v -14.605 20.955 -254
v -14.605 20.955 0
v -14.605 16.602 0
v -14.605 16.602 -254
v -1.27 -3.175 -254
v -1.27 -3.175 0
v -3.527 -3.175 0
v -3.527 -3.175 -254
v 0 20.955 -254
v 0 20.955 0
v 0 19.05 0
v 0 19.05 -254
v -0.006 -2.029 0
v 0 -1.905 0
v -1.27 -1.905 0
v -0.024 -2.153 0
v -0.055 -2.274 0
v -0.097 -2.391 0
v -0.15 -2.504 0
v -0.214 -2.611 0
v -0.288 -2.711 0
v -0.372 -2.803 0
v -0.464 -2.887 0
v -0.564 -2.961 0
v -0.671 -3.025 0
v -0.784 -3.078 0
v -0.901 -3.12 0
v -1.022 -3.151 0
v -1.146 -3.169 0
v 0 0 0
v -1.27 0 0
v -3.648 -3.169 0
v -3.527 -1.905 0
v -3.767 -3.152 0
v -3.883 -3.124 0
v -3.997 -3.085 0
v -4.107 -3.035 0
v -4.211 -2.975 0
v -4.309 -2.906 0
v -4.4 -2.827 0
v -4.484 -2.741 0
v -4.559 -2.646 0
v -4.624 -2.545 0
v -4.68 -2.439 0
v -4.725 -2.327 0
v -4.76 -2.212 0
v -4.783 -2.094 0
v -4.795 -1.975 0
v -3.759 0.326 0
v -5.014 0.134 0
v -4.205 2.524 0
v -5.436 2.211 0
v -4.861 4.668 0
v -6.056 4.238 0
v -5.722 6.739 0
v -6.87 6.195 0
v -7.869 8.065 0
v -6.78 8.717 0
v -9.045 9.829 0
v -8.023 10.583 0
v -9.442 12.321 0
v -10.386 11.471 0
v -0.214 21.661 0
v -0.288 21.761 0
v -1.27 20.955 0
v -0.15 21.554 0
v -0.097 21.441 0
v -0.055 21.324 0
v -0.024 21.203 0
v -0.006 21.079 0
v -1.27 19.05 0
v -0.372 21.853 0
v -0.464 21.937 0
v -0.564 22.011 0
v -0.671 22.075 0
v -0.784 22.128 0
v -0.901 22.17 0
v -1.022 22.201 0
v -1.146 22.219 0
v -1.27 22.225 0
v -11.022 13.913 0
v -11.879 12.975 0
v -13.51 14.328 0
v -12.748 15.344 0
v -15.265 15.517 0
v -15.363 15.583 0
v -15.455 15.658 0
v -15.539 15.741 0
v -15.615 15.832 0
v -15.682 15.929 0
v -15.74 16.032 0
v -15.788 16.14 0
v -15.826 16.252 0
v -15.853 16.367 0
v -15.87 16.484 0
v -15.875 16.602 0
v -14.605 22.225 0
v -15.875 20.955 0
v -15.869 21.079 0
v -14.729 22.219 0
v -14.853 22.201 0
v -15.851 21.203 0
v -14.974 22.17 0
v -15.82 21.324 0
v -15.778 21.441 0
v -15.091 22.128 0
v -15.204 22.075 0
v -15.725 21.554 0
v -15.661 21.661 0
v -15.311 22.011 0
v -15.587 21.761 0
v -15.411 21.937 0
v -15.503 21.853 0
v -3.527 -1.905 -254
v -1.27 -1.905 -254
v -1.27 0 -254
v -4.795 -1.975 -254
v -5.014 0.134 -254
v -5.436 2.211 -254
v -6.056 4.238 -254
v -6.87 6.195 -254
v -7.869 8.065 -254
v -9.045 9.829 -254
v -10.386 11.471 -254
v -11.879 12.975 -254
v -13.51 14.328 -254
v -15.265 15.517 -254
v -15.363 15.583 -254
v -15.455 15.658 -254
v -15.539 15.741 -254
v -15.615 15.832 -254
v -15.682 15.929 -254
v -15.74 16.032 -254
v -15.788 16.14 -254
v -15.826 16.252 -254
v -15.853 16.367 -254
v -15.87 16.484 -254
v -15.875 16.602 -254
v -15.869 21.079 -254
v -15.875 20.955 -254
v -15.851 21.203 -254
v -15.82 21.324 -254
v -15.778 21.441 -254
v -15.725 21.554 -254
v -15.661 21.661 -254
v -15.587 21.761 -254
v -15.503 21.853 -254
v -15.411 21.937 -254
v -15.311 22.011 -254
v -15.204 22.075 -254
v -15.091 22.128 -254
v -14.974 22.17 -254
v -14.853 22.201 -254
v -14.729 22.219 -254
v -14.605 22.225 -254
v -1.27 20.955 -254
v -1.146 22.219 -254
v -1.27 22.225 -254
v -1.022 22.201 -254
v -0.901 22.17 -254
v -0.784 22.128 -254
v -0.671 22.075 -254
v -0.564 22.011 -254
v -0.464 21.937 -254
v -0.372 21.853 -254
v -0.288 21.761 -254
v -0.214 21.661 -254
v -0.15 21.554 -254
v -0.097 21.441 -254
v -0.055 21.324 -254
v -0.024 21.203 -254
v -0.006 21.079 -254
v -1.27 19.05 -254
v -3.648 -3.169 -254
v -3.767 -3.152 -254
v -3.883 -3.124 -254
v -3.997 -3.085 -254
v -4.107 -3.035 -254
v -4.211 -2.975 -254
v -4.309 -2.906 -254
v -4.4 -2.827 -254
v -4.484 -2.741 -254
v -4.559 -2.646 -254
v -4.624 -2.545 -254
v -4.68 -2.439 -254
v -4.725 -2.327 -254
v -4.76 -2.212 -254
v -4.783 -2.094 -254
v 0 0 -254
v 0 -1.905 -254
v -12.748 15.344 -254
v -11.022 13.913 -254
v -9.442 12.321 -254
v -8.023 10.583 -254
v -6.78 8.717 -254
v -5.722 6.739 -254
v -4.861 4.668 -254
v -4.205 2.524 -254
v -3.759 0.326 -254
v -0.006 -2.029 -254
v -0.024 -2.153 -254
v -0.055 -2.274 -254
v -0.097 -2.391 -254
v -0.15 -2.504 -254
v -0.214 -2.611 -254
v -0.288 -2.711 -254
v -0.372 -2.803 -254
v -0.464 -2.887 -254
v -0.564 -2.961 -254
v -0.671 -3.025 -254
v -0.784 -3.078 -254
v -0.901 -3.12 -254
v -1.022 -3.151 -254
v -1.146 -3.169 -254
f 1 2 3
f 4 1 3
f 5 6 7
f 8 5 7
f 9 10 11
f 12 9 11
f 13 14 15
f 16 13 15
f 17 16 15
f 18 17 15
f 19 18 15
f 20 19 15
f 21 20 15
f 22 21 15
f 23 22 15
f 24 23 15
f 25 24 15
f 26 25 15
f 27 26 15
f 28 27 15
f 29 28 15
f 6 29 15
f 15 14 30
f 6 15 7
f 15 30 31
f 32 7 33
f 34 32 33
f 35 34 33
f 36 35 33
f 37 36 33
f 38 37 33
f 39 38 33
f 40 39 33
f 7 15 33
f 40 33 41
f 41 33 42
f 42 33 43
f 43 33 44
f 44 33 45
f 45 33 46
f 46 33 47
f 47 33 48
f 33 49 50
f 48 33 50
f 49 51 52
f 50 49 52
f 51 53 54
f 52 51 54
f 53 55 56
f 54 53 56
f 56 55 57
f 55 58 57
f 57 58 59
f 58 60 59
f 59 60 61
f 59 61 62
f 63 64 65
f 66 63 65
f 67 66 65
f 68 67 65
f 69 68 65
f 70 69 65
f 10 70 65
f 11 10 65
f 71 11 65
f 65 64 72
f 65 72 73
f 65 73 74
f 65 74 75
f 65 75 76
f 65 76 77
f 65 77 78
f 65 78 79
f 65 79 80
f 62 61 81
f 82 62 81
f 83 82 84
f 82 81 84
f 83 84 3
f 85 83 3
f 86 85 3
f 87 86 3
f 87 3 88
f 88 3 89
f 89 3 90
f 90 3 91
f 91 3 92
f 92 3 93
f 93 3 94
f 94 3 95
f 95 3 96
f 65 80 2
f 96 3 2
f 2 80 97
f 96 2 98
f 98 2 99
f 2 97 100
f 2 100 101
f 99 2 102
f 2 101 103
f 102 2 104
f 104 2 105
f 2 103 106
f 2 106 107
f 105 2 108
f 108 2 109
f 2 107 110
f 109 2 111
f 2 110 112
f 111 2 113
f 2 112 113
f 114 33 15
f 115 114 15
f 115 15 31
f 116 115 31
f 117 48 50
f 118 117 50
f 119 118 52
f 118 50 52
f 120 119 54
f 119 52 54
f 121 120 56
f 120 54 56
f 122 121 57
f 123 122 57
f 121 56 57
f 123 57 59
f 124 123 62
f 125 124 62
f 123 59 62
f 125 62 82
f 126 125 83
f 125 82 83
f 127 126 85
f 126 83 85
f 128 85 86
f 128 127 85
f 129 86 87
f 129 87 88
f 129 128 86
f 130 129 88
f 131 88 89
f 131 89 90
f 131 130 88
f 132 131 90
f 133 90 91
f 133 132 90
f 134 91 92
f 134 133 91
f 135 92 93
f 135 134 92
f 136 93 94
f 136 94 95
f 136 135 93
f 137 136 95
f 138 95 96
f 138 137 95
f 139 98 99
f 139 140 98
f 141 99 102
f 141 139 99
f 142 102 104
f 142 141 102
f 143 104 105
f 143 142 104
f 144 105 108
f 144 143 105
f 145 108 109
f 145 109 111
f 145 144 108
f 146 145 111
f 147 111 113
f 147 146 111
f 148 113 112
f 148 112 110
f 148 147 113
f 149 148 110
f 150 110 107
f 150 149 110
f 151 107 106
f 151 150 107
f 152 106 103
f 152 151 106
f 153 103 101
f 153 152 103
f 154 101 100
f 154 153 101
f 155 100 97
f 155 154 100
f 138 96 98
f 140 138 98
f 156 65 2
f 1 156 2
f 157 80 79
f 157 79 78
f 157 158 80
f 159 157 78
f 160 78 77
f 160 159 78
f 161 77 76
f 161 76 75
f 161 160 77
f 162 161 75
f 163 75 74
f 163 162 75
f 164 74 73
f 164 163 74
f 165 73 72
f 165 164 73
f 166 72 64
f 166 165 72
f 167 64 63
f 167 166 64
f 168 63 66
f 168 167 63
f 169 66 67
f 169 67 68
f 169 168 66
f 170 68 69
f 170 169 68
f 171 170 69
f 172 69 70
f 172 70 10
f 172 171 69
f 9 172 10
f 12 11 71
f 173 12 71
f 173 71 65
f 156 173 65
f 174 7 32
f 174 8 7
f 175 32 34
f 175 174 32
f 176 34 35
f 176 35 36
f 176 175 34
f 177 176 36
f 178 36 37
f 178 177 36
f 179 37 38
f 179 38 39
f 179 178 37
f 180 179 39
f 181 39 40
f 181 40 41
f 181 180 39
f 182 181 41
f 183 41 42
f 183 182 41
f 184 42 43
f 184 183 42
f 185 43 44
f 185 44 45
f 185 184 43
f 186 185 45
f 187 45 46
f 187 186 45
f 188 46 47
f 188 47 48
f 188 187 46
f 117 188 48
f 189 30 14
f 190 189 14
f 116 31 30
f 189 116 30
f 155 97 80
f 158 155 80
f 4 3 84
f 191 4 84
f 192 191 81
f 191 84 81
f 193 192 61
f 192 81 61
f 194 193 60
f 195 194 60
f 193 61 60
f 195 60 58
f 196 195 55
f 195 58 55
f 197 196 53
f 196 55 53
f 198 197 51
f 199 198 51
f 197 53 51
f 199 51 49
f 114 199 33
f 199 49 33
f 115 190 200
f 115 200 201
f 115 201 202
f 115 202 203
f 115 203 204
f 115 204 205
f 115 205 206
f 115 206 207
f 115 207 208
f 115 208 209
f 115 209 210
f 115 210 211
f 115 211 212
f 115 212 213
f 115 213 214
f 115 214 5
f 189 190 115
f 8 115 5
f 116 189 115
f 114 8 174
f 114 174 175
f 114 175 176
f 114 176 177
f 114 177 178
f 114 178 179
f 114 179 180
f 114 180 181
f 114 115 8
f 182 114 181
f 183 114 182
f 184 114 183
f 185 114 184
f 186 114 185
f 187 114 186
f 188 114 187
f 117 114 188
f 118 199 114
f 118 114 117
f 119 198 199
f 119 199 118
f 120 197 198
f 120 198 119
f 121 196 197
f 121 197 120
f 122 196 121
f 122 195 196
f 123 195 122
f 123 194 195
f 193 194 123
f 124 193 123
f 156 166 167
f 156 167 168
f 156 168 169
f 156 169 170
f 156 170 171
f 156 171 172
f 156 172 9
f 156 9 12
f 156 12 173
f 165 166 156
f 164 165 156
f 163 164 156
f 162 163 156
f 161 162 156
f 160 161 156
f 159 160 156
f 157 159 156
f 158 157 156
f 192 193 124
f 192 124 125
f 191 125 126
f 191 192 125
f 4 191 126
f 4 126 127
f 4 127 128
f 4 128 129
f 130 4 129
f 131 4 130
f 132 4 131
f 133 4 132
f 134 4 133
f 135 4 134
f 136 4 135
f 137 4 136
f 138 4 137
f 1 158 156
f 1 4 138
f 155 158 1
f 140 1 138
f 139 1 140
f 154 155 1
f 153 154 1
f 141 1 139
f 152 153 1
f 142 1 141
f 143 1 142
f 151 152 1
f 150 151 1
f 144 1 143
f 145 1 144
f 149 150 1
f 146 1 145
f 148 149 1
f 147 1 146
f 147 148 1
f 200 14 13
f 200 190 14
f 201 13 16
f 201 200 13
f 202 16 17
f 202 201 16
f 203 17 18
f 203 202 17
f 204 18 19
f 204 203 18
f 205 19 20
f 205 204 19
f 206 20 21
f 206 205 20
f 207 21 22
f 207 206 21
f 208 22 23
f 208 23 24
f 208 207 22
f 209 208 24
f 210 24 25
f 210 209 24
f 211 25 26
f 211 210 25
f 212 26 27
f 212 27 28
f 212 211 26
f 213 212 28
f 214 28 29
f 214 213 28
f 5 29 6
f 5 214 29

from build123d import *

# Parameters (mm, degrees)
EXTRUDE_THIN1_DEPTH = 254
FILLET1_R           = 1.27


with BuildPart() as part:
    # Sketch1 → Extrude-Thin1 (new body)
    with BuildSketch(Plane.XY):
        with BuildLine():
            Line((0, 0), (0, -3.175))
            Line((0, -3.175), (-4.7625, -3.175))
            ThreePointArc((-4.7625, -3.175), (-7.743674429, 7.852127417), (-15.875, 15.875))
            Line((-15.875, 15.875), (-15.875, 22.225))
            Line((-15.875, 22.225), (0, 22.225))
            Line((0, 22.225), (0, 19.05))
            Line((0, 19.05), (-1.27, 19.05))
            Line((-1.27, 19.05), (-1.27, 20.955))
            Line((-1.27, 20.955), (-14.605, 20.955))
            Line((-14.605, 20.955), (-14.605, 16.601962608))
            ThreePointArc((-14.605, 16.601962608), (-6.779670812, 8.71710723), (-3.527354833, -1.905))
            Line((-3.527354833, -1.905), (-1.27, -1.905))
            Line((-1.27, -1.905), (-1.27, 0))
            Line((-1.27, 0), (0, 0))
        make_face()
    extrude(amount=-EXTRUDE_THIN1_DEPTH)

    # Fillet1
    fillet1_edges = [part.edges().sort_by_distance(p)[0] for p in [
        (0, -3.175, -127),
        (-4.7625, -3.175, -127),
        (-15.875, 15.875, -127),
        (-15.875, 22.225, -127),
        (0, 22.225, -127),
    ]]
    fillet(fillet1_edges, radius=FILLET1_R)


solid = part.part
